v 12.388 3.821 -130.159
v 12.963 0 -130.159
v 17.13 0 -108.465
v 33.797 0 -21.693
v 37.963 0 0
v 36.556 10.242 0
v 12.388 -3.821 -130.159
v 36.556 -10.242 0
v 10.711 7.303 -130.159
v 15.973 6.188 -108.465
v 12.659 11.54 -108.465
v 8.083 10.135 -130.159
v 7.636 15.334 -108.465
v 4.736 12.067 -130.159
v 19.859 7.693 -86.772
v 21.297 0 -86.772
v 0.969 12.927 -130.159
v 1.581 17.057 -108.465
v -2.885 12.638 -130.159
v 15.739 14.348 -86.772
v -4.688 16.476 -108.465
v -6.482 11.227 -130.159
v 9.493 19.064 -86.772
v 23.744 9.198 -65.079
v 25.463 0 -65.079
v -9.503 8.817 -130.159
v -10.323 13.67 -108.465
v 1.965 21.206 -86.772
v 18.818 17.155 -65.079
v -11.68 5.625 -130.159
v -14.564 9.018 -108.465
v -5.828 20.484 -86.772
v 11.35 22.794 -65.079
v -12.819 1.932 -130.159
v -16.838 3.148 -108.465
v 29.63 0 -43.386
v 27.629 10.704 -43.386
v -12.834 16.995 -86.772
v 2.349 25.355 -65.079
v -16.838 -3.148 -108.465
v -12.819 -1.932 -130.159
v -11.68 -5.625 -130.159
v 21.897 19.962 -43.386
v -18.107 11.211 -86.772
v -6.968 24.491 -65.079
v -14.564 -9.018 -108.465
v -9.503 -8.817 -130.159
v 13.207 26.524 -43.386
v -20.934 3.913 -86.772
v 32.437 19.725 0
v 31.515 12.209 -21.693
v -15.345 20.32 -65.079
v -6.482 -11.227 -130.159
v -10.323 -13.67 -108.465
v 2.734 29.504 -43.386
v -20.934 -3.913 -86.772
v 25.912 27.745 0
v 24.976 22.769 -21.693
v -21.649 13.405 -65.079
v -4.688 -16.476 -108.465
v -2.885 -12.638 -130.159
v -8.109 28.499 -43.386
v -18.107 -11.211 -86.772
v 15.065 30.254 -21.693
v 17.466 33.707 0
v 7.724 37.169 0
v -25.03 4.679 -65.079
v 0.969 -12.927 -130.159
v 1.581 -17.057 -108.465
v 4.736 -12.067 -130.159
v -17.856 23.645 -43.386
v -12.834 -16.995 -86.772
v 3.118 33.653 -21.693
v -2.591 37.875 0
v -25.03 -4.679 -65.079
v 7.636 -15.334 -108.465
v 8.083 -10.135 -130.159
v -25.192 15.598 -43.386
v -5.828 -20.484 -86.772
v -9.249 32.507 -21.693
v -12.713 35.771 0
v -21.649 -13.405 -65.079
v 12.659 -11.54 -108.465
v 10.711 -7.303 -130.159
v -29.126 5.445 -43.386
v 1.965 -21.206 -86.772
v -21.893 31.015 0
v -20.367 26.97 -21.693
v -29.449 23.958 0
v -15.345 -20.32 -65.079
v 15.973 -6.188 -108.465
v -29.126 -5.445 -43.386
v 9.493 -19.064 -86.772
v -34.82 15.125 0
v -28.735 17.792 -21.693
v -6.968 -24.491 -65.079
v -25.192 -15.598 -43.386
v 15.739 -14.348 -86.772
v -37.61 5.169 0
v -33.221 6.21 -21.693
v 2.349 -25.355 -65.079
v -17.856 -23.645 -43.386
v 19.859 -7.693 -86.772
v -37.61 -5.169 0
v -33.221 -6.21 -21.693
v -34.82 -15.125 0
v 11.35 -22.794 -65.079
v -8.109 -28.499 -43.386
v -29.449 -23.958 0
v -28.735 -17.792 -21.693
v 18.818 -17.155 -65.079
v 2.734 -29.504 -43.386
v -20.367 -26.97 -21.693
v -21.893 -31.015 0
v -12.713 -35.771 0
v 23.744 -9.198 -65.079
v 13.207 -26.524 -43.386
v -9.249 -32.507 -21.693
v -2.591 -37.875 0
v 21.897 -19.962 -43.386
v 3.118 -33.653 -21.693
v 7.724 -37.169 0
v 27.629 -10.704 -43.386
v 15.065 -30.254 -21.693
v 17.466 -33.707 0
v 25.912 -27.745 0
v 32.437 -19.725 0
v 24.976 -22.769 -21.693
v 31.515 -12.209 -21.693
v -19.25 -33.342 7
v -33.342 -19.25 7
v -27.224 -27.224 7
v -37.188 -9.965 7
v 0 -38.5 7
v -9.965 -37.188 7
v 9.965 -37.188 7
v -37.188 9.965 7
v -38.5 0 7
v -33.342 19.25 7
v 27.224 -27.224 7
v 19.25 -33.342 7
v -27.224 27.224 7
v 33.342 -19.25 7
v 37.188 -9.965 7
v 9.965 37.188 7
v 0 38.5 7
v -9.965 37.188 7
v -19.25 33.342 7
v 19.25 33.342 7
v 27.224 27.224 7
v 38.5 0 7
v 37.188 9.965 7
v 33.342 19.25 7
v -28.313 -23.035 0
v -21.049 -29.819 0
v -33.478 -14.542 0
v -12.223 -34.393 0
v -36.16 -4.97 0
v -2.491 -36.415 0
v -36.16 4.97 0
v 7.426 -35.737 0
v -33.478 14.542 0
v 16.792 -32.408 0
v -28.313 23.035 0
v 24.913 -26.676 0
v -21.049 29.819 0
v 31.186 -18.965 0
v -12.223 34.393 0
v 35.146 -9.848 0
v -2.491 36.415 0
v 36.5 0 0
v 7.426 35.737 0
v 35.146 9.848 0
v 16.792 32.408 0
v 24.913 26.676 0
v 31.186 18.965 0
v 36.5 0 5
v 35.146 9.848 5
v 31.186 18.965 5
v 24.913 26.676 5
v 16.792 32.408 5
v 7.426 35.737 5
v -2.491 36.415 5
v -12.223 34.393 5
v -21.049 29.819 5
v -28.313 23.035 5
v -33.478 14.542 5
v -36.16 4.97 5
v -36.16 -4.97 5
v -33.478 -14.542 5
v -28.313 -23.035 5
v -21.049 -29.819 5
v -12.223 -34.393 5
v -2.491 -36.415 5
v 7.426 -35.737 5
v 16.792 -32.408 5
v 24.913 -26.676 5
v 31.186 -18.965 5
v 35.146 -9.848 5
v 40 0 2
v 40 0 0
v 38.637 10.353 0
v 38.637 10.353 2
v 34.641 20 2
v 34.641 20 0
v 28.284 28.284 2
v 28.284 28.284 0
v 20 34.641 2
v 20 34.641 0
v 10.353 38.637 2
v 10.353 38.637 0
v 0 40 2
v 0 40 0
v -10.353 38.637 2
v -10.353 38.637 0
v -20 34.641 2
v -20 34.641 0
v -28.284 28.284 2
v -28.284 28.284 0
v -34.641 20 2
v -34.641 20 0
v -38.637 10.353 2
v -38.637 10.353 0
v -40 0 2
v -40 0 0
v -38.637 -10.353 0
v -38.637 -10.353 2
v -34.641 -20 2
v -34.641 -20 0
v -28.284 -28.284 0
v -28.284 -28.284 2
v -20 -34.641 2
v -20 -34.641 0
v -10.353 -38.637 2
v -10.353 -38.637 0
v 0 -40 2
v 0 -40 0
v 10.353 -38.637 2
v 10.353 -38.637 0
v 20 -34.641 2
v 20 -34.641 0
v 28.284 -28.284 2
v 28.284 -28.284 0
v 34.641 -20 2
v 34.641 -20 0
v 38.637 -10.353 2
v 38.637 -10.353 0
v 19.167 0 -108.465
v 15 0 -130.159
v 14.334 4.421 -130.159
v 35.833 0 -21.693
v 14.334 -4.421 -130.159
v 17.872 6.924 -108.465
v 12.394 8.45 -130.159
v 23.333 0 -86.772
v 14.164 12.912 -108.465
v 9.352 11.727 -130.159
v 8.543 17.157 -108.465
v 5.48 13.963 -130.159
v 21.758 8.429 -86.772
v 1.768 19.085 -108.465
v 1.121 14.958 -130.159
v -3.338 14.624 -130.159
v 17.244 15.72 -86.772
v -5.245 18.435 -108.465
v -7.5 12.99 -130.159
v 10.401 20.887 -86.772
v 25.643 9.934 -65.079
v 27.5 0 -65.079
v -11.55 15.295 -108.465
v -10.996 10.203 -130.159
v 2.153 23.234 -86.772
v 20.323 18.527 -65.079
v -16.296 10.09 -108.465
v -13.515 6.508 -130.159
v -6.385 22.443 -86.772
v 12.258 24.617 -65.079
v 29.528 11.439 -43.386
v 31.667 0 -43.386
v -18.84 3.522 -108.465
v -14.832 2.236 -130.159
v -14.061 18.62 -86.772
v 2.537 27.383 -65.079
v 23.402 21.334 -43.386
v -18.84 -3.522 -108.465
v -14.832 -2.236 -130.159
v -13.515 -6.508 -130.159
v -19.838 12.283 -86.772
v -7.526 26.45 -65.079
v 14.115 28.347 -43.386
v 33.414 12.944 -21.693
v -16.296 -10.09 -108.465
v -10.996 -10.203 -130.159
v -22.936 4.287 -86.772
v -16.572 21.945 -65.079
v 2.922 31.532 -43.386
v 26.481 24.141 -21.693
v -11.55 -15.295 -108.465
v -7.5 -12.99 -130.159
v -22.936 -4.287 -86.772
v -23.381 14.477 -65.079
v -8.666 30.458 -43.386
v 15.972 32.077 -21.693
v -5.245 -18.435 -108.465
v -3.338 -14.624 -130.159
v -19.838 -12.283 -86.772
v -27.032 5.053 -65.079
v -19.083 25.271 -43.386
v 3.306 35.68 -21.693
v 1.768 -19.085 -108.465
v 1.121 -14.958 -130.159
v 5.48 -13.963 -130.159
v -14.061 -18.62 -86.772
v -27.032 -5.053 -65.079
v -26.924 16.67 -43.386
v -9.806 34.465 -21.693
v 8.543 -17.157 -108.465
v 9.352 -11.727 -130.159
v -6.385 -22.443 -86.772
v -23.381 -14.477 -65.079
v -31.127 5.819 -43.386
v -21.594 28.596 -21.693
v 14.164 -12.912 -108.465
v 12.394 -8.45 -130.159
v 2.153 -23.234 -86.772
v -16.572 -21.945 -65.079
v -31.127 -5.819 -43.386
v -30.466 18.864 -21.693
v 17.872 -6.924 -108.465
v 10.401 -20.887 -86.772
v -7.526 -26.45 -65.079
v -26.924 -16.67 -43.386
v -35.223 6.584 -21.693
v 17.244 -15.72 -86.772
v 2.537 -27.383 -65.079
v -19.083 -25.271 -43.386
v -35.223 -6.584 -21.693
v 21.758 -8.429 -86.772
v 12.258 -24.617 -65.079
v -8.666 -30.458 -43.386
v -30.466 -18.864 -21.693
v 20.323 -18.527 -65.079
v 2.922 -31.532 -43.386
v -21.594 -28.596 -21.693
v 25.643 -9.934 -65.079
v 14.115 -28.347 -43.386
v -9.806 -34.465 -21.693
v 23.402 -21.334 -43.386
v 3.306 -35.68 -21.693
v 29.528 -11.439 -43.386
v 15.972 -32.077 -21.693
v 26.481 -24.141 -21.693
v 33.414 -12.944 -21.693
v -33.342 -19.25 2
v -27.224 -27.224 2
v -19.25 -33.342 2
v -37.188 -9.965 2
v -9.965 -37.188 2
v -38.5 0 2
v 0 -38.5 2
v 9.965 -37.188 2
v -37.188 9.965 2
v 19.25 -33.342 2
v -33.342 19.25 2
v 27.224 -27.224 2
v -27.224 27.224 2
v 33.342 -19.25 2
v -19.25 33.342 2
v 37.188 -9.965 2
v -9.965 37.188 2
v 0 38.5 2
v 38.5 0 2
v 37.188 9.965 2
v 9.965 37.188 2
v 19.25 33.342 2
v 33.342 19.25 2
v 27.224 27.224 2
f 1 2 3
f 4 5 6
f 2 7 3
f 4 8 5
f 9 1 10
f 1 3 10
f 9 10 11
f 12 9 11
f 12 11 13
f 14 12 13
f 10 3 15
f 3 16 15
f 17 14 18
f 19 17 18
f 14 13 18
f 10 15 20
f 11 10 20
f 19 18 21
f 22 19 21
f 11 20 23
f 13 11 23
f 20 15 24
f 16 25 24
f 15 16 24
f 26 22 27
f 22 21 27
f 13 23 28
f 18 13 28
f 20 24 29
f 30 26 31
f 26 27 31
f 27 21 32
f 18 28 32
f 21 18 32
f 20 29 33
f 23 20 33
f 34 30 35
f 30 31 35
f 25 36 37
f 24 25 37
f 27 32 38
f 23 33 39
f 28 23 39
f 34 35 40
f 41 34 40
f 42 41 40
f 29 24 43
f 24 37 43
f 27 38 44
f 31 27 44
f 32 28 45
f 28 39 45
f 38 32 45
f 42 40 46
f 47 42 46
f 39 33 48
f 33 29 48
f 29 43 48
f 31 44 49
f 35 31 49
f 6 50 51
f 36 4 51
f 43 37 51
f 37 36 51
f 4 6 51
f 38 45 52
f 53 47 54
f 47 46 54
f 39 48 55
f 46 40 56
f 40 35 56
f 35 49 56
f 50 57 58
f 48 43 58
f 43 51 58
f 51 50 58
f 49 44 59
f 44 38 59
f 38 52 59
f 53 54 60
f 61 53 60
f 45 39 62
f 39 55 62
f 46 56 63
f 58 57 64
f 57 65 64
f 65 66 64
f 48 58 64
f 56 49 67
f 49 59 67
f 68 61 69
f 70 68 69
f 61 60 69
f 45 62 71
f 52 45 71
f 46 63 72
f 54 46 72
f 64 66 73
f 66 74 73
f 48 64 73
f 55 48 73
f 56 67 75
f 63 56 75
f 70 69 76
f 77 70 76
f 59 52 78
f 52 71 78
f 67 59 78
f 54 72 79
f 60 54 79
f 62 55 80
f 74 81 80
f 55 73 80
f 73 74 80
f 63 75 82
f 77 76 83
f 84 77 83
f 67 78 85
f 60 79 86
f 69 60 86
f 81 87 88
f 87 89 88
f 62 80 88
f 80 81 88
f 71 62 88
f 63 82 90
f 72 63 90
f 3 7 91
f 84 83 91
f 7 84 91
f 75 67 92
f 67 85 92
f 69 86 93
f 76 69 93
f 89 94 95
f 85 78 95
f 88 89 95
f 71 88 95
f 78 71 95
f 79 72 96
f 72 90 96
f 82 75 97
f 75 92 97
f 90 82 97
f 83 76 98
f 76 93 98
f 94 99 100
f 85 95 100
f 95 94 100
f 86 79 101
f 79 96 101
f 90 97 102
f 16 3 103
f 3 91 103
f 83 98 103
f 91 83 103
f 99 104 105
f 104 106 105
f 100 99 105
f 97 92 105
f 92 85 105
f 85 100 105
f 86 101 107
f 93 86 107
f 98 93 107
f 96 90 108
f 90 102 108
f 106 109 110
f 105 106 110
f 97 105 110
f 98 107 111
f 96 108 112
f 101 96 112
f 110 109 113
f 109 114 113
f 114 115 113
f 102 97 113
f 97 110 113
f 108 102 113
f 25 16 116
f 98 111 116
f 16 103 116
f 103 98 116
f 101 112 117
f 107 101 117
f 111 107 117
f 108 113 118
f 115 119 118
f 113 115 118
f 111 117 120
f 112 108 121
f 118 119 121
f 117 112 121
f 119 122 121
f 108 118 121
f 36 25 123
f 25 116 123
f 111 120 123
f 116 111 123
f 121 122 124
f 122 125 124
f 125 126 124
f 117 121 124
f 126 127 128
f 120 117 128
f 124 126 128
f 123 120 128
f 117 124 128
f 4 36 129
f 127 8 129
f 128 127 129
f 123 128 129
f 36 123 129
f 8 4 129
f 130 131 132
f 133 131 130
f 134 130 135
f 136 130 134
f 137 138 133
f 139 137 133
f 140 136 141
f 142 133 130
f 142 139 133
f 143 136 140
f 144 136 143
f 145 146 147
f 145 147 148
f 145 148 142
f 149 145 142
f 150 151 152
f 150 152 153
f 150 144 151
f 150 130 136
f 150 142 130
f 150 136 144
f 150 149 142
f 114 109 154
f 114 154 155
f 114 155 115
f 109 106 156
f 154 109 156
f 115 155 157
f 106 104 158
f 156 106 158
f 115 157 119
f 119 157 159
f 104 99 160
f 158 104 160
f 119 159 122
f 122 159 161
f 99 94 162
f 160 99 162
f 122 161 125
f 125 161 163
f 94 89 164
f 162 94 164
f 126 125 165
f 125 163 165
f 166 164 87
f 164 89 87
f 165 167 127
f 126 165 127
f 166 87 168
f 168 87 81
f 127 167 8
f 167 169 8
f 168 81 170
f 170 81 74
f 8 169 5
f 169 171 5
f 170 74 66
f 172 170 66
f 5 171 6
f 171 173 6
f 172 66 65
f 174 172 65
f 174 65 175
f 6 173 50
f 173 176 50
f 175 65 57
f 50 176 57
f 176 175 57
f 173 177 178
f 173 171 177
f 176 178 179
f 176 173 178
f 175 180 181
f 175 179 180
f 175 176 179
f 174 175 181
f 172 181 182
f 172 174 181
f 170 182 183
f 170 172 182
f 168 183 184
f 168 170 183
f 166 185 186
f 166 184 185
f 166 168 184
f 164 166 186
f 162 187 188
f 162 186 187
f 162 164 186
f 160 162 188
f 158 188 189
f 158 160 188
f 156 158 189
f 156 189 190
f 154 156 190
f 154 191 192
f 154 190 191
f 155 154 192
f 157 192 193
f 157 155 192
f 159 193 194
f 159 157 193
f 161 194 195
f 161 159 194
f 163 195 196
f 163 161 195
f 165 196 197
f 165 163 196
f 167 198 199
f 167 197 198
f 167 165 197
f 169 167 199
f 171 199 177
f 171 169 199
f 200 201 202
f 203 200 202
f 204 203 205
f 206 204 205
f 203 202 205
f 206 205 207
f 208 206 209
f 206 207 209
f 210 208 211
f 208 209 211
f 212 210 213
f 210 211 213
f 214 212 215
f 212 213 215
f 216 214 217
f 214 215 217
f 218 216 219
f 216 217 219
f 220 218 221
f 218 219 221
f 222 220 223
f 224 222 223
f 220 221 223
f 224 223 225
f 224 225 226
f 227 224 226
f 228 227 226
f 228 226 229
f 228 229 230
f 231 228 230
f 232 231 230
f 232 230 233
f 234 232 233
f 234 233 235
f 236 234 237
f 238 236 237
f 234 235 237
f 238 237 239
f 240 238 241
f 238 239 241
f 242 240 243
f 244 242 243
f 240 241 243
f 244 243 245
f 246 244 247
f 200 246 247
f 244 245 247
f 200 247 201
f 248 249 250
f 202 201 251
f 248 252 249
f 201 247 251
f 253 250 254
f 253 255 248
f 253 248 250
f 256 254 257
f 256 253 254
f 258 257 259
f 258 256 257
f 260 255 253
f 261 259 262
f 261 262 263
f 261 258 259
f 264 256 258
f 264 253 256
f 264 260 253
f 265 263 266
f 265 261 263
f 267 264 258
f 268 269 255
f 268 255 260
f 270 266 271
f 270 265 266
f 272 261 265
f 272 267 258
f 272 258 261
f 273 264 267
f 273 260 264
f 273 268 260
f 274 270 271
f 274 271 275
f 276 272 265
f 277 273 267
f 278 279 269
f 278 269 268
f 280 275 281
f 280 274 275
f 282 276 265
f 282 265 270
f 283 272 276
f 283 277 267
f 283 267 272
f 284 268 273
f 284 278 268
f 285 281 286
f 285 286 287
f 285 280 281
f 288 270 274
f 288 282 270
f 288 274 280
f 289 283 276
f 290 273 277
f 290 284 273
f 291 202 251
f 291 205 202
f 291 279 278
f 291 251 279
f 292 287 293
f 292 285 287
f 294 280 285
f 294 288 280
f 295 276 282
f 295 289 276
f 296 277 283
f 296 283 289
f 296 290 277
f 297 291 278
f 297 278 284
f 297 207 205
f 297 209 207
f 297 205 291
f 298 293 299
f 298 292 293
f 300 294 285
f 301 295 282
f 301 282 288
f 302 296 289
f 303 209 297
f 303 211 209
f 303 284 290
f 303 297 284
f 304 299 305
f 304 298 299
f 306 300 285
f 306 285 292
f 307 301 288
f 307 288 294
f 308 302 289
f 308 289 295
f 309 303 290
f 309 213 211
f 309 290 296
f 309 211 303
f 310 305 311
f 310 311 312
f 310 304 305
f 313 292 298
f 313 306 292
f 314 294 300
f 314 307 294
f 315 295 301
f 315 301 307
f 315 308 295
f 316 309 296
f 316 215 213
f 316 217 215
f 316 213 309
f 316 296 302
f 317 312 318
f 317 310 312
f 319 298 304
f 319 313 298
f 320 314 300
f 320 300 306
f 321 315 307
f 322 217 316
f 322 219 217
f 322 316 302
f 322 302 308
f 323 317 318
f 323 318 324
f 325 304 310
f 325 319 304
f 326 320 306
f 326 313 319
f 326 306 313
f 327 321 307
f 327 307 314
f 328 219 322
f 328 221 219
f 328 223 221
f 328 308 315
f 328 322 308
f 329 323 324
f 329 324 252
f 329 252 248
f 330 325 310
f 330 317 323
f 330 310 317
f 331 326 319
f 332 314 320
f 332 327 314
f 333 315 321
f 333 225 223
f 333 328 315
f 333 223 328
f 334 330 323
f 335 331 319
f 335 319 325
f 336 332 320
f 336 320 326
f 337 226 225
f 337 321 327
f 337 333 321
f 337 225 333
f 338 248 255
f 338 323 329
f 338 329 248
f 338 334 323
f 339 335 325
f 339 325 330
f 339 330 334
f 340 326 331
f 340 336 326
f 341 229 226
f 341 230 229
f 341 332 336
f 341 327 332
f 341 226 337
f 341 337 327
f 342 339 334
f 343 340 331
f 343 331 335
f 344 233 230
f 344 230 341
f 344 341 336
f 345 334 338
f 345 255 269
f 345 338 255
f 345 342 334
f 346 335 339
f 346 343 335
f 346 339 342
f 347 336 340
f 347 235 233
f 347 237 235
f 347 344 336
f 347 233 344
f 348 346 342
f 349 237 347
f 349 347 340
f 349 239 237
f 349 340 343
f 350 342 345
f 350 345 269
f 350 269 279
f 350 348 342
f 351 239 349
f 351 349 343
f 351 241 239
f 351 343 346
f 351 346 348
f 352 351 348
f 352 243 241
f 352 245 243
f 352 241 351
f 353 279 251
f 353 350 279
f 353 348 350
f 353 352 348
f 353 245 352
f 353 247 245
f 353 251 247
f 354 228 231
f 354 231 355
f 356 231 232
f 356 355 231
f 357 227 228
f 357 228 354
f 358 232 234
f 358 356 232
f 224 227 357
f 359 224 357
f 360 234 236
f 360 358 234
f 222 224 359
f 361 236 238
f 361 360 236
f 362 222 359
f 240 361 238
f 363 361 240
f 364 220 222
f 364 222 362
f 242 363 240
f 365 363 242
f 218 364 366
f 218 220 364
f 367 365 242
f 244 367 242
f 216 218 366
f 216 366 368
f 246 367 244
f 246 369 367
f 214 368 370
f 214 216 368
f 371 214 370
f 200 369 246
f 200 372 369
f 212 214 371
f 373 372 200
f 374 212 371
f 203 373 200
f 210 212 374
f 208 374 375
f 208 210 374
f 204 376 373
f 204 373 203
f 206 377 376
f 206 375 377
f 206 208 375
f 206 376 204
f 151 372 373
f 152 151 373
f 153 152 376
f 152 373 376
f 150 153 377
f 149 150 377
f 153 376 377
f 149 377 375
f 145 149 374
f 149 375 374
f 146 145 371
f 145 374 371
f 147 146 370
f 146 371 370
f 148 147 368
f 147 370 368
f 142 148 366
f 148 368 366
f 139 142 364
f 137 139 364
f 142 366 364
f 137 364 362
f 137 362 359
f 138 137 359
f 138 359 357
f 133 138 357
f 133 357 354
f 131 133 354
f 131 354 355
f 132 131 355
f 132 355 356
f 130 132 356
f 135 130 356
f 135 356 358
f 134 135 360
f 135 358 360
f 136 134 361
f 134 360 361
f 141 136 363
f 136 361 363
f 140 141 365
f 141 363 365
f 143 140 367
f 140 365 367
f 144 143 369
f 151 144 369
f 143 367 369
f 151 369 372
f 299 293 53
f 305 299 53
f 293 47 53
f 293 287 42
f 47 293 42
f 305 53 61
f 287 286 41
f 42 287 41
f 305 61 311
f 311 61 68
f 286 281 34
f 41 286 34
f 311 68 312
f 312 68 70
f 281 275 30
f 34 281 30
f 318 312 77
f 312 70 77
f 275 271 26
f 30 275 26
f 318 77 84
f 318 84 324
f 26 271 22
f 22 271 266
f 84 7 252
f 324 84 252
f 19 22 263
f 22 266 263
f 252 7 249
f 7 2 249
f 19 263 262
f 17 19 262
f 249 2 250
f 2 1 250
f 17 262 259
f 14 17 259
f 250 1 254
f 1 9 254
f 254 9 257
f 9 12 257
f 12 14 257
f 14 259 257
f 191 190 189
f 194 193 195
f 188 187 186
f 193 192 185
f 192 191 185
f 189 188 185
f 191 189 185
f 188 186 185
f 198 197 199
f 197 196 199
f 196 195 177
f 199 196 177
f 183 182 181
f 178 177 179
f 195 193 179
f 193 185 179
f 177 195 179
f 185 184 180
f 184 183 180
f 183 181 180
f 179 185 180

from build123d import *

# Parameters (mm, degrees)
F0_R     = 40
F1_DEPTH = 2
F2_R     = 38.5
F3_DEPTH = 5
F7_R     = 15
F4_R     = 40
F9_T     = -2


with BuildPart() as f1:
    # F0 (on Top) → F1 (new body)
    with BuildSketch(Plane.XY):
        Circle(F0_R)
    extrude(amount=F1_DEPTH)

    # F2 (on face) → F3 (join)
    with BuildSketch(Plane.XY.offset(2)):
        Circle(F2_R)
    extrude(amount=F3_DEPTH)

    # F7 (on plane+point) → F8 section 0
    with BuildSketch(Plane.XY.offset(-130.1585063338)):
        Circle(F7_R)
    # F4 (on face) → F8 section 1
    with BuildSketch(Plane(origin=(0, 0, 0), x_dir=(1, 0, 0), z_dir=(0, 0, -1))):
        Circle(F4_R)
    loft()

    # F9
    f9_openings = [f1.faces().sort_by_distance(p)[0] for p in [
        (0, 0, -130.158506),
    ]]
    offset(amount=F9_T, openings=f9_openings, kind=Kind.INTERSECTION)


solid = f1.part
